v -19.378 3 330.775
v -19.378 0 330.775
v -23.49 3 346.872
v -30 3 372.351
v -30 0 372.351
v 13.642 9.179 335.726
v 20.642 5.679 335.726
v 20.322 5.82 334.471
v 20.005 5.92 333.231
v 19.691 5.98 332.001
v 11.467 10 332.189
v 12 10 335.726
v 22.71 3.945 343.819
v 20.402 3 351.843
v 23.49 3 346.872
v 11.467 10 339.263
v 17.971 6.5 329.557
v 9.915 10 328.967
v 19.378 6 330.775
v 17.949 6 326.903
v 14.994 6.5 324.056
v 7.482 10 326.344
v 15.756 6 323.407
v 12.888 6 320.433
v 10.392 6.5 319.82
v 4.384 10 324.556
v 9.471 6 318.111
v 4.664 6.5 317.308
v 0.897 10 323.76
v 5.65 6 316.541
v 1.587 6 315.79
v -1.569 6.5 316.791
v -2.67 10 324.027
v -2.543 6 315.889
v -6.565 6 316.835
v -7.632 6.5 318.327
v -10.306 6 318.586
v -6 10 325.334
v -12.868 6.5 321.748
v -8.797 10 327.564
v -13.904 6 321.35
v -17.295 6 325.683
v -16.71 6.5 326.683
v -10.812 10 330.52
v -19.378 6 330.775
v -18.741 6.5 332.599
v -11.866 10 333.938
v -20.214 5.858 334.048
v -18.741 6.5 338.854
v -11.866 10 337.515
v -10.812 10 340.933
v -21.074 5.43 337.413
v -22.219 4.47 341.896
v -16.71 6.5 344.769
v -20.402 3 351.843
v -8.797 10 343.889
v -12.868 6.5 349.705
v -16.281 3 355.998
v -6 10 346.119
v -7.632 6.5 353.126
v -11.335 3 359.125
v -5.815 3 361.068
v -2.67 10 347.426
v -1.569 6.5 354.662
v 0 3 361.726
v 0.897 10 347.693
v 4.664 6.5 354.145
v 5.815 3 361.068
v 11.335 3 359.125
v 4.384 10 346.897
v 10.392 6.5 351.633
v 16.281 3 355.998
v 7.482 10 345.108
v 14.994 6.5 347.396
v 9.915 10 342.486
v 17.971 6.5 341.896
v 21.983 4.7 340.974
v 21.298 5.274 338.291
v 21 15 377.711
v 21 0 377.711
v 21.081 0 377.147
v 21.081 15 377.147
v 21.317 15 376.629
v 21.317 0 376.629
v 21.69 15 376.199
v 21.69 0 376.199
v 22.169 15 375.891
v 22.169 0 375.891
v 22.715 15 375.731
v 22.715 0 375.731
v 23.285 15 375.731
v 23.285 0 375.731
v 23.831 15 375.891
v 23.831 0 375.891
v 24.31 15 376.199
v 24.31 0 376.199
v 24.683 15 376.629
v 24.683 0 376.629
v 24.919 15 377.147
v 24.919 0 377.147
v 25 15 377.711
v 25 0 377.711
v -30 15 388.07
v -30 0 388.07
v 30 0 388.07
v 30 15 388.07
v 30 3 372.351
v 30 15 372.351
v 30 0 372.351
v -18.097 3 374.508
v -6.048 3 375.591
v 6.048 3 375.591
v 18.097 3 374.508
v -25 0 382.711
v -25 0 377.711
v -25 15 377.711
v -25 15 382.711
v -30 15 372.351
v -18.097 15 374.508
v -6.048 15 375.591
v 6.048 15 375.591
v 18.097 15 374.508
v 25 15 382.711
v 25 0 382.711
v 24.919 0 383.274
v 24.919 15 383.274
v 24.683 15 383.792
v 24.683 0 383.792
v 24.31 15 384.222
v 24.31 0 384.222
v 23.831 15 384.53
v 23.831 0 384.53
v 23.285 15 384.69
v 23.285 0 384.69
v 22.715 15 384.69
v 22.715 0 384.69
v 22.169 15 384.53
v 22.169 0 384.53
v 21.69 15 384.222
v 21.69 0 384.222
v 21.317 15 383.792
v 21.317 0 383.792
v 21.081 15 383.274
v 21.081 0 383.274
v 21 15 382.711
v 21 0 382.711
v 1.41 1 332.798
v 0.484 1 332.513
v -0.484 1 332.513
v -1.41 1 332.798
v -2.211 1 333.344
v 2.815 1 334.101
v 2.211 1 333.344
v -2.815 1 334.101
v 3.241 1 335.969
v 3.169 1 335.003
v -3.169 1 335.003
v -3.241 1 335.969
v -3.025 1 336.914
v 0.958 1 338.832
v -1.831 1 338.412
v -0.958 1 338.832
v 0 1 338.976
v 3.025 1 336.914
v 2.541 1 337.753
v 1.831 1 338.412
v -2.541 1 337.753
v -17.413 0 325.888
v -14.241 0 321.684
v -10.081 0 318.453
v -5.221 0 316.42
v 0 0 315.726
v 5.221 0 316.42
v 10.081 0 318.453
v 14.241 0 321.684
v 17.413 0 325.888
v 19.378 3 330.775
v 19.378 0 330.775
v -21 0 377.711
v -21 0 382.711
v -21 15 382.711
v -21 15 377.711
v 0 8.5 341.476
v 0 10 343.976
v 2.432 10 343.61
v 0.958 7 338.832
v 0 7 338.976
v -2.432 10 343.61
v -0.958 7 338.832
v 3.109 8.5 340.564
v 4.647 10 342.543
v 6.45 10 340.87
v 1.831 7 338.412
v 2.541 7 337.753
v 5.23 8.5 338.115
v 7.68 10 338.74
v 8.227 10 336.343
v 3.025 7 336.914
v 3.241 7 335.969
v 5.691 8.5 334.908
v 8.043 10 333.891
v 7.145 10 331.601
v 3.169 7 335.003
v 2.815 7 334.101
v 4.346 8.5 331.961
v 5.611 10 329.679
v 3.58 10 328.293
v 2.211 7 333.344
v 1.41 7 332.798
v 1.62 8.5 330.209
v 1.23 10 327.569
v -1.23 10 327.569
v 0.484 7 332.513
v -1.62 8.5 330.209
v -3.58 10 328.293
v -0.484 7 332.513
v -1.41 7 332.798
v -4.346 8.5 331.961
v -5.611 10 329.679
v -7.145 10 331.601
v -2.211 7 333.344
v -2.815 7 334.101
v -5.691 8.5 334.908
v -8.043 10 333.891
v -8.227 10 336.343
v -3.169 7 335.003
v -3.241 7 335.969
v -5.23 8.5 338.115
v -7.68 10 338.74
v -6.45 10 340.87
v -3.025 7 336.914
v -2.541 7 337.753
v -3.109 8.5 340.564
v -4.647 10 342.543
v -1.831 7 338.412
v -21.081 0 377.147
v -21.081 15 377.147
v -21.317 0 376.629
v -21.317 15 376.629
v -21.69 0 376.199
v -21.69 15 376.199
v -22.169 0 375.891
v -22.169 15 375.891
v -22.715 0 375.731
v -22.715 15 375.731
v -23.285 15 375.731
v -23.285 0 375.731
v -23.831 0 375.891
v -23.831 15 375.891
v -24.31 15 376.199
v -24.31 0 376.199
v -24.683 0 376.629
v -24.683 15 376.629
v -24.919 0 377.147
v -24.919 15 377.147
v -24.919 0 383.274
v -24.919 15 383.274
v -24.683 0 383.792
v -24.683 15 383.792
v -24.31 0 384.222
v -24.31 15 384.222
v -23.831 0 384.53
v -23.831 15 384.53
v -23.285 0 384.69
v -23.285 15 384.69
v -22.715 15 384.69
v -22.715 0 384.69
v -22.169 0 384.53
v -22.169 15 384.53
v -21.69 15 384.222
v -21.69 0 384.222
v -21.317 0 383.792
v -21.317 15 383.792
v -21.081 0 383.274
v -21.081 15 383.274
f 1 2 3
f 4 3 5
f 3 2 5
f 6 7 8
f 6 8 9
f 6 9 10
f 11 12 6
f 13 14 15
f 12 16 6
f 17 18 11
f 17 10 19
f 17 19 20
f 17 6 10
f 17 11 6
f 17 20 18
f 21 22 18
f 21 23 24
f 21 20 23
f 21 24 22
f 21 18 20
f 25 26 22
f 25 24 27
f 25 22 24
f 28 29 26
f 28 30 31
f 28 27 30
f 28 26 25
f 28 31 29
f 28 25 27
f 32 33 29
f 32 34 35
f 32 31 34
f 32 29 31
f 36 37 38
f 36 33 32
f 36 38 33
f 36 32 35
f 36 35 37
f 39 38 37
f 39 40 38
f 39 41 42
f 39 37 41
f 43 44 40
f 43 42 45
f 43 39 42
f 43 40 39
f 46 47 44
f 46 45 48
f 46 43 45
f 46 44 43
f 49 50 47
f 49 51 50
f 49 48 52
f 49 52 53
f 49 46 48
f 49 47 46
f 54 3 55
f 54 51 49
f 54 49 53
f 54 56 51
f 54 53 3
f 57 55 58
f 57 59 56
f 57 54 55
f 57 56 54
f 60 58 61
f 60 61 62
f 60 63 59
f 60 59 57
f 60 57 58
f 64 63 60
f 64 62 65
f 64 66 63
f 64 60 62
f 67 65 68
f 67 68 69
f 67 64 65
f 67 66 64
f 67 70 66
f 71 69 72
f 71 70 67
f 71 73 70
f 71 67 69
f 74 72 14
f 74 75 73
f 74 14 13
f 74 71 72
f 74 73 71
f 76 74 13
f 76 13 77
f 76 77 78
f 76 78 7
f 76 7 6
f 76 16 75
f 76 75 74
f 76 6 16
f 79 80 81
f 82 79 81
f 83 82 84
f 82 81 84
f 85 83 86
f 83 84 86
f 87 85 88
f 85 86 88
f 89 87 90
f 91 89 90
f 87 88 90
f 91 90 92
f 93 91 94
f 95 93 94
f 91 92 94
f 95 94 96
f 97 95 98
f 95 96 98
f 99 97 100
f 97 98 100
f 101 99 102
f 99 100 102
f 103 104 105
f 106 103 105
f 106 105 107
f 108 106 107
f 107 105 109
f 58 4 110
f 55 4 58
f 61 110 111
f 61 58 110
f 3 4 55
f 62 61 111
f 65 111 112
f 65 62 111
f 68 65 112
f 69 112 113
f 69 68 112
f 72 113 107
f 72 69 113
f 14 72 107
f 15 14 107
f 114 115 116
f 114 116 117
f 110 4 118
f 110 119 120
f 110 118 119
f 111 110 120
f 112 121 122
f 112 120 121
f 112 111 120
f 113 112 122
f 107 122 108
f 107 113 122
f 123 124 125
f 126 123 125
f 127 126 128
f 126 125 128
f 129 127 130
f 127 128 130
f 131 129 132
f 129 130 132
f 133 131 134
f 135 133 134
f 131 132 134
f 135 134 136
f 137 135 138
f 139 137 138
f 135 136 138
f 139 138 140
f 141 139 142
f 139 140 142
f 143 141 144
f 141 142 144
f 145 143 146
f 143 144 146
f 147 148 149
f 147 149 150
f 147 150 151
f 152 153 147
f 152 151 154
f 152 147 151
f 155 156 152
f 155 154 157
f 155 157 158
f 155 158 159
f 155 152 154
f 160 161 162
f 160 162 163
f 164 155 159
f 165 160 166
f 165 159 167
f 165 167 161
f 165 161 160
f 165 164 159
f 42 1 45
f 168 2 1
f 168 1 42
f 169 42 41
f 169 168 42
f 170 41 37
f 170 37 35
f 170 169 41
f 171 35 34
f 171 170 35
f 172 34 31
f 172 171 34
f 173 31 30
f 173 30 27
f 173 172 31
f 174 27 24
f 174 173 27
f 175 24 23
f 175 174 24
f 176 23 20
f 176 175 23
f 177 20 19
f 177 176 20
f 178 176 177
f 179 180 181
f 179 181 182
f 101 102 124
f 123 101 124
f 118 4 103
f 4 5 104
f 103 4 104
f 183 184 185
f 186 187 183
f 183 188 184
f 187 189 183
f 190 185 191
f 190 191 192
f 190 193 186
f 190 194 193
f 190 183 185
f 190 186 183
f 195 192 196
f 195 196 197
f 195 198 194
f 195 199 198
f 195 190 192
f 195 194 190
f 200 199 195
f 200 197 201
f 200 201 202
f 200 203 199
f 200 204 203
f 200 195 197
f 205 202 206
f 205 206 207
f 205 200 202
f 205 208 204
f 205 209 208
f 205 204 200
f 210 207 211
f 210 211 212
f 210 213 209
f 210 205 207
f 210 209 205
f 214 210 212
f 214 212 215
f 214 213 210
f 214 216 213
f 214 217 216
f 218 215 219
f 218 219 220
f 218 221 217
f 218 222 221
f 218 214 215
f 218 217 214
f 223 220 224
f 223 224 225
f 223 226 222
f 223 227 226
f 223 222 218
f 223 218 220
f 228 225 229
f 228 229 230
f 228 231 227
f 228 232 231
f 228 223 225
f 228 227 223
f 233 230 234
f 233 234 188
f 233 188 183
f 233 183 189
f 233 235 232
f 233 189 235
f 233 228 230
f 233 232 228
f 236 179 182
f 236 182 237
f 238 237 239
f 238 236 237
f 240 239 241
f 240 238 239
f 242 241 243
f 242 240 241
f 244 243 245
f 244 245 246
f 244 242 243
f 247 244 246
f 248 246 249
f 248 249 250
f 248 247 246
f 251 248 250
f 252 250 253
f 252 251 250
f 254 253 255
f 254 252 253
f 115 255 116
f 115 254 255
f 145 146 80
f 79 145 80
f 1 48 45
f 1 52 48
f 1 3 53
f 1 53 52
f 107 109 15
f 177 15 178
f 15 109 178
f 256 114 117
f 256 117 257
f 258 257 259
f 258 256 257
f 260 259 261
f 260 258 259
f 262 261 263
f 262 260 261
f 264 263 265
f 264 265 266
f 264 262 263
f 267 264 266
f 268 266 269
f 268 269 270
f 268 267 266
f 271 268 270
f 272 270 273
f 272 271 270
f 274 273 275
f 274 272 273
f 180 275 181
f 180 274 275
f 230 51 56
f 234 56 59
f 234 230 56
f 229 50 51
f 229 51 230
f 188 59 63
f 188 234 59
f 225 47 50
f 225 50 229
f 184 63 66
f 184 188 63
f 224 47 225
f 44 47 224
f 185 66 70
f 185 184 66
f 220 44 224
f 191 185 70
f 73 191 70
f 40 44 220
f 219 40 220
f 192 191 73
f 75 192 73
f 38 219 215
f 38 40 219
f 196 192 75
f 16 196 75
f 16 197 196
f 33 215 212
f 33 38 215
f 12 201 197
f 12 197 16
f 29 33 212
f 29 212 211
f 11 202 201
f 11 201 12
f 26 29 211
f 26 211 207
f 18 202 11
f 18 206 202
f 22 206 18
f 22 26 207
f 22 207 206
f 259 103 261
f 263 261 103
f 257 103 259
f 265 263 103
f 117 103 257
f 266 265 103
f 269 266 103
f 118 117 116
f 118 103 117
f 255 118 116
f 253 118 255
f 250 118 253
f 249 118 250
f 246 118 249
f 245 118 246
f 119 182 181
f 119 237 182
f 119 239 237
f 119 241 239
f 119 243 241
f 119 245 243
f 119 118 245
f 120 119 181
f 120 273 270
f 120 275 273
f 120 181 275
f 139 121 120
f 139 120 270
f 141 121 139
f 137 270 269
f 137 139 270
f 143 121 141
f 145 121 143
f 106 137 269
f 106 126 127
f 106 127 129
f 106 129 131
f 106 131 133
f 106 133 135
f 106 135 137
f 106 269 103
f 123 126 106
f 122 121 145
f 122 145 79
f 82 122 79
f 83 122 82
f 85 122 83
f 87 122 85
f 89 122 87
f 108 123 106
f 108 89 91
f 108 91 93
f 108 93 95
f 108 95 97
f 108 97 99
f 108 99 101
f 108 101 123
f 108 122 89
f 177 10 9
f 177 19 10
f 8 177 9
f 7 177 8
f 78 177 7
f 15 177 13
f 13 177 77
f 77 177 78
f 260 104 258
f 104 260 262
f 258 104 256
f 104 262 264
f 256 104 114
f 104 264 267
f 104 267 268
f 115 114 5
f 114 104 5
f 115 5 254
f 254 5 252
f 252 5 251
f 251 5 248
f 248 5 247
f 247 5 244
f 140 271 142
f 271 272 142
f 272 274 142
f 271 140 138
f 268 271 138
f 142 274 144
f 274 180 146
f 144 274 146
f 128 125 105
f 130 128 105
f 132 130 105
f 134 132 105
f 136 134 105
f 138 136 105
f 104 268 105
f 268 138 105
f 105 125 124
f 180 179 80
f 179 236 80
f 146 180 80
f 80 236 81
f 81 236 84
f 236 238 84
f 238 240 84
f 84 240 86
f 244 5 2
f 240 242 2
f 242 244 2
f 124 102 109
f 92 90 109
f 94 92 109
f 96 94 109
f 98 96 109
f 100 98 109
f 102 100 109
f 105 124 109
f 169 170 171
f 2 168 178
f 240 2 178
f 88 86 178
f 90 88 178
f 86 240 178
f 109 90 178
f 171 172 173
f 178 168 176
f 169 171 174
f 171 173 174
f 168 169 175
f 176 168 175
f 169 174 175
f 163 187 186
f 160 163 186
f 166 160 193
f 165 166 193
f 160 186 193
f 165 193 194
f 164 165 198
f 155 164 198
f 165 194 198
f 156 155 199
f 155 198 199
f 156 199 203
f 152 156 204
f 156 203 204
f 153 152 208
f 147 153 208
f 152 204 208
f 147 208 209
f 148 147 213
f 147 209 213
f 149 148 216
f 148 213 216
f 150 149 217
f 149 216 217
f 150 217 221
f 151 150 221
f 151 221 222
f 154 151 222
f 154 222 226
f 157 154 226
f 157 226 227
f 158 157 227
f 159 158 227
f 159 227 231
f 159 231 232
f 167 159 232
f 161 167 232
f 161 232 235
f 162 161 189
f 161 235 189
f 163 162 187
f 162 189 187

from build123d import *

# Parameters (mm, degrees)
BOSS_EXTRUDE1_DEPTH    = 15
BOSS_EXTRUDE2_DEPTH    = 10
SKETCH3_R              = 3.25
CUT_EXTRUDE1_DEPTH     = 9
CUT_EXTRUDE2_START     = -7
SKETCH4_R              = 6
CUT_EXTRUDE2_DEPTH     = 7
CHAMFER1_START         = 3
CHAMFER1_2_DEPTH       = 7
CHAMFER1_3_OUTLINE_R   = 12
CHAMFER1_3_OUTLINE_R_2 = 6
CHAMFER1_3_DEPTH       = 7
CHAMFER2_SIZE          = 5
CHAMFER2_SIZE2         = 3


with BuildPart() as part:
    # Sketch1 → Boss-Extrude1 (new body)
    with BuildSketch(Plane(origin=(0, 0, 0), x_dir=(1, 0, 0), z_dir=(0, 1, 0))):
        with BuildLine():
            Line((-30, -388.070415552), (30, -388.070415552))
            Line((30, -388.070415552), (30, -372.350901436))
            ThreePointArc((30, -372.350901436), (0, -375.726435625), (-30, -372.350901436))
            Line((-30, -372.350901436), (-30, -388.070415552))
        make_face()
        with BuildLine():
            Line((-21, -382.710658494), (-21, -377.710658494))
            ThreePointArc((-21, -377.710658494), (-23, -375.710658494), (-25, -377.710658494))
            Line((-25, -377.710658494), (-25, -382.710658494))
            ThreePointArc((-25, -382.710658494), (-23, -384.710658494), (-21, -382.710658494))
        make_face(mode=Mode.SUBTRACT)
        with BuildLine():
            Line((25, -377.710658494), (25, -382.710658494))
            ThreePointArc((25, -382.710658494), (23, -384.710658494), (21, -382.710658494))
            Line((21, -382.710658494), (21, -377.710658494))
            ThreePointArc((21, -377.710658494), (23, -375.710658494), (25, -377.710658494))
        make_face(mode=Mode.SUBTRACT)
    extrude(amount=BOSS_EXTRUDE1_DEPTH)

    # Sketch2 → Boss-Extrude2 (add)
    with BuildSketch(Plane(origin=(0, 0, 0), x_dir=(1, 0, 0), z_dir=(0, 1, 0))):
        with BuildLine():
            Line((30, -372.350901436), (19.377517729, -330.775495649))
            ThreePointArc((19.377517729, -330.775495649), (0, -315.726435625), (-19.377517729, -330.775495649))
            Line((-19.377517729, -330.775495649), (-30, -372.350901436))
            ThreePointArc((-30, -372.350901436), (0, -375.726435625), (30, -372.350901436))
        make_face()
    extrude(amount=BOSS_EXTRUDE2_DEPTH)

    # Sketch3 → Cut-Extrude1 (cut)
    with BuildSketch(Plane(origin=(0, 10, 0), x_dir=(1, 0, 0), z_dir=(0, 1, 0))):
        with Locations(Location((0, -335.726435625, 0), (0, 0, 270))):
            Circle(SKETCH3_R)
    extrude(amount=-CUT_EXTRUDE1_DEPTH, mode=Mode.SUBTRACT)

    # Sketch4 → Cut-Extrude2 (cut)
    with BuildSketch(Plane(origin=(0, 10, 0), x_dir=(1, 0, 0), z_dir=(0, 1, 0)).offset(CUT_EXTRUDE2_START)):
        with BuildLine():
            Line((30, -372.350901436), (19.377517729, -330.775495649))
            ThreePointArc((19.377517729, -330.775495649), (0, -315.726435625), (-19.377517729, -330.775495649))
            Line((-19.377517729, -330.775495649), (-30, -372.350901436))
            ThreePointArc((-30, -372.350901436), (0, -375.726435625), (30, -372.350901436))
        make_face()
        with Locations(Location((0, -335.726435625, 0), (0, 0, 270))):
            Circle(SKETCH4_R, mode=Mode.SUBTRACT)
    extrude(amount=CUT_EXTRUDE2_DEPTH, mode=Mode.SUBTRACT)

    # Chamfer1: read off the stored shape, not the designer's step
    # Chamfer1 outline → Chamfer1 (revolve)
    with BuildSketch(Plane.XY.offset(335.726435625)):
        Polygon((26, 3), (12, 10), (12, 3), align=None)
    revolve(axis=Axis((0, 0, 335.726435625), (0, 1, 0)))

    # Chamfer1 2 outline → Chamfer1 2 (cut)
    with BuildSketch(Plane(origin=(0, 0, 0), x_dir=(1, 0, 0), z_dir=(0, 1, 0)).offset(CHAMFER1_START)):
        with BuildLine():
            ThreePointArc((-19.377517729, -330.775495649), (0, -315.726435625), (19.377517729, -330.775495649))
            Line((19.377517729, -330.775495649), (24.033863727, -349))
            Line((24.033863727, -349), (27, -349))
            Line((27, -349), (27, -308))
            Line((27, -308), (-27, -308))
            Line((-27, -308), (-27, -349))
            Line((-27, -349), (-24.033863727, -349))
            Line((-24.033863727, -349), (-19.377517729, -330.775495649))
        make_face()
    extrude(amount=CHAMFER1_2_DEPTH, mode=Mode.SUBTRACT)

    # Chamfer1 3 outline → Chamfer1 3 (add)
    with BuildSketch(Plane(origin=(0, 0, 0), x_dir=(1, 0, 0), z_dir=(0, 1, 0)).offset(CHAMFER1_START)):
        with Locations((0, -335.726435625)):
            Circle(CHAMFER1_3_OUTLINE_R)
        with Locations((0, -335.726435625)):
            Circle(CHAMFER1_3_OUTLINE_R_2, mode=Mode.SUBTRACT)
    extrude(amount=CHAMFER1_3_DEPTH)

    # Chamfer2
    chamfer2_edges = [part.edges().sort_by_distance(p)[0] for p in [
        (0, 10, 332.476435625),
    ]]
    chamfer2_side = [part.faces().sort_by_distance(p)[0] for p in [
        (-11.660588745, 10, 335.726435625),
    ]]
    chamfer(chamfer2_edges, length=CHAMFER2_SIZE, length2=CHAMFER2_SIZE2, reference=chamfer2_side[0])


solid = part.part
